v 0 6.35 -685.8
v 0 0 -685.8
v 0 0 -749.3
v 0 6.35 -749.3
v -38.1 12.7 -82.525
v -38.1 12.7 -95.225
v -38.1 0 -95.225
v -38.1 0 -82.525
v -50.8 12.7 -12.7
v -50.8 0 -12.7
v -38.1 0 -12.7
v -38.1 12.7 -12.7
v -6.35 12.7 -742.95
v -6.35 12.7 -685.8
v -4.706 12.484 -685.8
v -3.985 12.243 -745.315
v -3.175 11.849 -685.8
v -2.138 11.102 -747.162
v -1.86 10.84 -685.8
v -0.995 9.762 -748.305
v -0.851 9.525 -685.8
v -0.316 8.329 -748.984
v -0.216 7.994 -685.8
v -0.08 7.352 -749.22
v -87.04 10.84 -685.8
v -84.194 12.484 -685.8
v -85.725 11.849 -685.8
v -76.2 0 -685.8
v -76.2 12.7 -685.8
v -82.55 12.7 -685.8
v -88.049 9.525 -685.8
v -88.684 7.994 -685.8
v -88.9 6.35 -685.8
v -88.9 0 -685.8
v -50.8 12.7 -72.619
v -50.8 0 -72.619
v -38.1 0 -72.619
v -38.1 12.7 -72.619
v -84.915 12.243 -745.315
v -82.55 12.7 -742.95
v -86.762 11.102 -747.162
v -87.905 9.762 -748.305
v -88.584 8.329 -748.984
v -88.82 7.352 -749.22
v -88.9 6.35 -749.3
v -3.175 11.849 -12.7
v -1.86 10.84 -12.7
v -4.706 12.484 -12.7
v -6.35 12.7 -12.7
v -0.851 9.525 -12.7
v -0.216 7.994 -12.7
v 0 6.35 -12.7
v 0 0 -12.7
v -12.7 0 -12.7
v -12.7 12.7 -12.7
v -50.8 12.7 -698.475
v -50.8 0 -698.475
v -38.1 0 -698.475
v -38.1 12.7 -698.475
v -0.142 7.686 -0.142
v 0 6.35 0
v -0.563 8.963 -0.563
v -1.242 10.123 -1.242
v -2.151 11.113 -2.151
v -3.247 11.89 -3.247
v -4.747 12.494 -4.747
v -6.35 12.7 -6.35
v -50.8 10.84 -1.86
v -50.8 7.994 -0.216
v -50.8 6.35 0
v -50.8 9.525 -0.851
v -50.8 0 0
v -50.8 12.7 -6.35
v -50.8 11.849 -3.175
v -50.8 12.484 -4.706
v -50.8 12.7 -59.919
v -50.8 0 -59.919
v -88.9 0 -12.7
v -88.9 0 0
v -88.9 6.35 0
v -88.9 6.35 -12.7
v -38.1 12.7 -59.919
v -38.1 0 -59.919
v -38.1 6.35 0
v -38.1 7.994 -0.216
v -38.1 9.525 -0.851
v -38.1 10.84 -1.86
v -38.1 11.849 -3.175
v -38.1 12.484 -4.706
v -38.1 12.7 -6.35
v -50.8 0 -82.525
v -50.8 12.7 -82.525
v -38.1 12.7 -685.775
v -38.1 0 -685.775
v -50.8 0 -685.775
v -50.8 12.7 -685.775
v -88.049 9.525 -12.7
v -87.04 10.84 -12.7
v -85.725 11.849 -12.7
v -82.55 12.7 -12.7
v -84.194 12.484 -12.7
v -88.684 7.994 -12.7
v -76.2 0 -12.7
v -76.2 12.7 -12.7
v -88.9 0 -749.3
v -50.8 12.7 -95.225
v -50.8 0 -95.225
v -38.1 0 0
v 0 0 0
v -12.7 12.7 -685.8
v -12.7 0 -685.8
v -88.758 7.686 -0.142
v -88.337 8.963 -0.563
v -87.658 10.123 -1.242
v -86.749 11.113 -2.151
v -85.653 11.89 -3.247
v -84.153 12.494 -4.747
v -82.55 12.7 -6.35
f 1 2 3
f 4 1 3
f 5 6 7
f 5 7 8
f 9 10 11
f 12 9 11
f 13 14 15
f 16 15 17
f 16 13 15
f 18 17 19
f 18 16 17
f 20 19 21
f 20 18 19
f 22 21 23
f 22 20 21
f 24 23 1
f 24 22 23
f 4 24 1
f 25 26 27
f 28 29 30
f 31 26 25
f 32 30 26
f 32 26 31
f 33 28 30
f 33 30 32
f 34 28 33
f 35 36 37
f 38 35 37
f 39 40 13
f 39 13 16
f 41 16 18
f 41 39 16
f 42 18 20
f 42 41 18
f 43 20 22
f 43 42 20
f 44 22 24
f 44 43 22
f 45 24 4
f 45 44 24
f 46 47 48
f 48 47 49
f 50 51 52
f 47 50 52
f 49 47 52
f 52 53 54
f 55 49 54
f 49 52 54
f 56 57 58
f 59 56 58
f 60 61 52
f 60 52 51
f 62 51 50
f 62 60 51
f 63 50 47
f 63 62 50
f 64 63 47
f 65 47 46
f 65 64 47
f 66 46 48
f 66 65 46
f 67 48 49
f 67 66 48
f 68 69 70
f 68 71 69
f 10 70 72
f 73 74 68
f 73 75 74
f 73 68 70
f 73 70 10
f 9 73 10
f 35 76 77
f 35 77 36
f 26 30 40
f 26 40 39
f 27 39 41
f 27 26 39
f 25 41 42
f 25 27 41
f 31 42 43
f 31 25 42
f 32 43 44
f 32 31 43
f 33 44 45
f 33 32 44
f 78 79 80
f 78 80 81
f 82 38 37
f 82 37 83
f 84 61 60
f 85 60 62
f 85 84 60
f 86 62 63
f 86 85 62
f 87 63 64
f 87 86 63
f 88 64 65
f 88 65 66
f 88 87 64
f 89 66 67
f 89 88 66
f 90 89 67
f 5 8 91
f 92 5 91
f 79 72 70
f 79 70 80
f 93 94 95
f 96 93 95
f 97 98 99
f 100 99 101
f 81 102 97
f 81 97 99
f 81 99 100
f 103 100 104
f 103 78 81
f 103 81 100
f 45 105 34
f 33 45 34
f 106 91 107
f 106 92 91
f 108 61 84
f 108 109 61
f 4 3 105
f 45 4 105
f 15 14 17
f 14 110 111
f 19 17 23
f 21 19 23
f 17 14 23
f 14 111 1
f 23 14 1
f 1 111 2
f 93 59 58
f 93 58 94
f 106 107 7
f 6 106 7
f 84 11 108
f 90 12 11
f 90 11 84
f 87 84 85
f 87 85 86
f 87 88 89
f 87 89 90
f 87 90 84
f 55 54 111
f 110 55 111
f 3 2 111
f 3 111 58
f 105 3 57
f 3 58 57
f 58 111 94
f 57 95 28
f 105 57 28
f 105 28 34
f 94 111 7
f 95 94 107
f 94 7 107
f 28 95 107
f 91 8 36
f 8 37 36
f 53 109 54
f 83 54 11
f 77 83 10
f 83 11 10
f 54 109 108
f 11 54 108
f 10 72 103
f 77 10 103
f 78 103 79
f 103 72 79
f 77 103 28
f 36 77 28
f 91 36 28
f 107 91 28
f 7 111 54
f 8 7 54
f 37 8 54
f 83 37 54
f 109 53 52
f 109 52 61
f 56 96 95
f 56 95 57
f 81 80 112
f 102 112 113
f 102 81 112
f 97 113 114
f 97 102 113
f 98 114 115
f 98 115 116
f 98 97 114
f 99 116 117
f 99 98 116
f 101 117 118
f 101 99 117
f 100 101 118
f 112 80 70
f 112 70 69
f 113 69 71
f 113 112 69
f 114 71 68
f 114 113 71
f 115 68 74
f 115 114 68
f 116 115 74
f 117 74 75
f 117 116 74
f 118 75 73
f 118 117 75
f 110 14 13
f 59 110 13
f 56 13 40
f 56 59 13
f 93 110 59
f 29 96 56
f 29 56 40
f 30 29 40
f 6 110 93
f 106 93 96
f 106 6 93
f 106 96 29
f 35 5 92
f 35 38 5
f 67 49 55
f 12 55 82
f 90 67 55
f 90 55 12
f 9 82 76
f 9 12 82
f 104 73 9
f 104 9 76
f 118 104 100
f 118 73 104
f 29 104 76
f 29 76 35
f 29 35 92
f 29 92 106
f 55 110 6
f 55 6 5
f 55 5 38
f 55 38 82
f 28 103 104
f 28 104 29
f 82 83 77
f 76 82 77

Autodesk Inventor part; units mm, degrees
ref_plane "YZ Plane" through (0, 0, 0) normal (1, 0, 0) x (0, 1, 0)
ref_plane "XZ Plane" through (0, 0, 0) normal (0, 1, 0) x (-1, 0, 0)
ref_plane "XY Plane" through (0, 0, 0) normal (0, 0, 1) x (1, 0, 0)
sketch "Sketch1" plane through (0, 0, 0) normal (0, 1, 0) x (-1, 0, 0)
  line L0 (0, 0) -> (88.9, 0)
  line L1 (88.9, 0) -> (76.2, 0) construction
  line L2 (76.2, 0) -> (76.2, -12.7) construction
  line L3 (76.2, -12.7) -> (88.9, -12.7) construction
  line L4 (88.9, -12.7) -> (88.9, 0) construction
  line L5 (0, -349.25) -> (88.9, -349.25) construction
  line L6 (88.9, -698.5) -> (76.2, -698.5) construction
  line L7 (76.2, -698.5) -> (76.2, -685.8) construction
  line L8 (76.2, -685.8) -> (88.9, -685.8) construction
  line L9 (0, 0) -> (12.7, 0) construction
  line L10 (12.7, 0) -> (12.7, -12.7) construction
  line L11 (12.7, -12.7) -> (0, -12.7) construction
  line L12 (0, -12.7) -> (0, 0) construction
  line L13 (0, -698.5) -> (12.7, -698.5) construction
  line L14 (12.7, -698.5) -> (12.7, -685.8) construction
  line L15 (12.7, -685.8) -> (0, -685.8) construction
  line L16 (88.9, -12.7) -> (76.2, -12.7)
  line L17 (76.2, -12.7) -> (76.2, -685.8)
  line L18 (76.2, -685.8) -> (88.9, -685.8)
  line L19 (12.7, -685.8) -> (0, -685.8)
  line L20 (0, -12.7) -> (12.7, -12.7)
  line L21 (12.7, -12.7) -> (12.7, -685.8)
  line L22 (0, -12.7) -> (0, 0)
  line L23 (88.9, 0) -> (88.9, -12.7)
  line L24 (0, -685.8) -> (0, -749.3)
  line L25 (0, -749.3) -> (88.9, -749.3)
  line L26 (88.9, -749.3) -> (88.9, -685.8)
  dimension "d2" = 12.7
  dimension "d3" = 12.7
  dimension "d8" = 88.9
  dimension "d10" = 63.5
extrude "Extrusion1" add sketch "Sketch1" along normal blind 12.7
fillet "Fillet1" radius 6.35 3 edges at (-44.45, 12.7, 0) (-88.9, 12.7, -6.35) (0, 12.7, -6.35)
fillet "Fillet3" radius 6.35 3 edges at (-44.45, 12.7, -749.3) (-88.9, 12.7, -717.55) (0, 12.7, -717.55)
sketch "Sketch2" plane through (0, 12.7, 0) normal (0, 1, 0) x (1, 0, 0)
  line L0 (-88.9, 749.3) -> (0, 749.3) construction
  line L1 (-44.45, 749.2751) -> (-44.45, 698.4751) construction
  line L2 (-44.45, 749.2751) -> (6.35, 749.2751) construction
  line L3 (-44.45, 698.4751) -> (-50.8, 698.4751) construction
  line L4 (-44.45, 698.4751) -> (-38.1, 698.4751) construction
  line L5 (-50.8, 698.4751) -> (-38.1, 698.4751)
  line L6 (-38.1, 698.4751) -> (-38.1, 685.7751)
  line L7 (-38.1, 685.7751) -> (-50.8, 685.7751)
  line L8 (-50.8, 685.7751) -> (-50.8, 698.4751)
  line L9 (-44.45, 685.7751) -> (-44.45, 95.2251) construction
  line L10 (-44.45, 95.2251) -> (-50.8, 95.2251) construction
  line L11 (-44.45, 95.2251) -> (-38.1, 95.2251) construction
  line L12 (-50.8, 95.2251) -> (-38.1, 95.2251)
  line L13 (-38.1, 95.2251) -> (-38.1, 82.5251)
  line L14 (-38.1, 82.5251) -> (-50.8, 82.5251)
  line L15 (-50.8, 82.5251) -> (-50.8, 95.2251)
  line L16 (-44.45, 82.5251) -> (-44.45, 72.6191) construction
  line L17 (-44.45, 82.5251) -> (-34.544, 82.5251) construction
  line L18 (-44.45, 72.6191) -> (-50.8, 72.6191) construction
  line L19 (-44.45, 72.6191) -> (-38.1, 72.6191) construction
  line L20 (-50.8, 72.6191) -> (-38.1, 72.6191)
  line L21 (-38.1, 72.6191) -> (-38.1, 59.9191)
  line L22 (-38.1, 59.9191) -> (-50.8, 59.9191)
  line L23 (-50.8, 59.9191) -> (-50.8, 72.6191)
  line L24 (-44.45, 59.9191) -> (-44.45, 12.6751) construction
  line L25 (-88.9, 0) -> (0, 0) construction
  line L26 (-44.45, 0) -> (-38.1, 0) construction
  line L27 (-44.45, 0) -> (-38.1, 0) construction
  line L28 (-38.1, 0) -> (-50.8, 0)
  line L29 (-50.8, 0) -> (-50.8, 12.7)
  line L30 (-50.8, 12.7) -> (-38.1, 12.7)
  line L31 (-38.1, 12.7) -> (-38.1, 0)
  line L32 (-44.45, 390.5001) -> (67.6838, 390.5001) construction
  dimension "d12" = 50.8
  dimension "d13" = 90
  dimension "d14" = 6.35
  dimension "d15" = 180
  dimension "d16" = 12.7
  dimension "d17" = 12.7
  dimension "d18" = 590.55
  dimension "d20" = 6.35
  dimension "d21" = 180
  dimension "d22" = 12.7
  dimension "d23" = 12.7
  dimension "d24" = 9.906
  dimension "d25" = 90
  dimension "d26" = 6.35
  dimension "d27" = 180
  dimension "d28" = 12.7
  dimension "d29" = 12.7
  dimension "d30" = 6.35
  dimension "d31" = 0
  dimension "d32" = 12.7
  dimension "d33" = 12.7
extrude "Extrusion2" cut sketch "Sketch2" along normal through all both and the other way through all
properties part number "Arm Top" material "PVC-Piping"
